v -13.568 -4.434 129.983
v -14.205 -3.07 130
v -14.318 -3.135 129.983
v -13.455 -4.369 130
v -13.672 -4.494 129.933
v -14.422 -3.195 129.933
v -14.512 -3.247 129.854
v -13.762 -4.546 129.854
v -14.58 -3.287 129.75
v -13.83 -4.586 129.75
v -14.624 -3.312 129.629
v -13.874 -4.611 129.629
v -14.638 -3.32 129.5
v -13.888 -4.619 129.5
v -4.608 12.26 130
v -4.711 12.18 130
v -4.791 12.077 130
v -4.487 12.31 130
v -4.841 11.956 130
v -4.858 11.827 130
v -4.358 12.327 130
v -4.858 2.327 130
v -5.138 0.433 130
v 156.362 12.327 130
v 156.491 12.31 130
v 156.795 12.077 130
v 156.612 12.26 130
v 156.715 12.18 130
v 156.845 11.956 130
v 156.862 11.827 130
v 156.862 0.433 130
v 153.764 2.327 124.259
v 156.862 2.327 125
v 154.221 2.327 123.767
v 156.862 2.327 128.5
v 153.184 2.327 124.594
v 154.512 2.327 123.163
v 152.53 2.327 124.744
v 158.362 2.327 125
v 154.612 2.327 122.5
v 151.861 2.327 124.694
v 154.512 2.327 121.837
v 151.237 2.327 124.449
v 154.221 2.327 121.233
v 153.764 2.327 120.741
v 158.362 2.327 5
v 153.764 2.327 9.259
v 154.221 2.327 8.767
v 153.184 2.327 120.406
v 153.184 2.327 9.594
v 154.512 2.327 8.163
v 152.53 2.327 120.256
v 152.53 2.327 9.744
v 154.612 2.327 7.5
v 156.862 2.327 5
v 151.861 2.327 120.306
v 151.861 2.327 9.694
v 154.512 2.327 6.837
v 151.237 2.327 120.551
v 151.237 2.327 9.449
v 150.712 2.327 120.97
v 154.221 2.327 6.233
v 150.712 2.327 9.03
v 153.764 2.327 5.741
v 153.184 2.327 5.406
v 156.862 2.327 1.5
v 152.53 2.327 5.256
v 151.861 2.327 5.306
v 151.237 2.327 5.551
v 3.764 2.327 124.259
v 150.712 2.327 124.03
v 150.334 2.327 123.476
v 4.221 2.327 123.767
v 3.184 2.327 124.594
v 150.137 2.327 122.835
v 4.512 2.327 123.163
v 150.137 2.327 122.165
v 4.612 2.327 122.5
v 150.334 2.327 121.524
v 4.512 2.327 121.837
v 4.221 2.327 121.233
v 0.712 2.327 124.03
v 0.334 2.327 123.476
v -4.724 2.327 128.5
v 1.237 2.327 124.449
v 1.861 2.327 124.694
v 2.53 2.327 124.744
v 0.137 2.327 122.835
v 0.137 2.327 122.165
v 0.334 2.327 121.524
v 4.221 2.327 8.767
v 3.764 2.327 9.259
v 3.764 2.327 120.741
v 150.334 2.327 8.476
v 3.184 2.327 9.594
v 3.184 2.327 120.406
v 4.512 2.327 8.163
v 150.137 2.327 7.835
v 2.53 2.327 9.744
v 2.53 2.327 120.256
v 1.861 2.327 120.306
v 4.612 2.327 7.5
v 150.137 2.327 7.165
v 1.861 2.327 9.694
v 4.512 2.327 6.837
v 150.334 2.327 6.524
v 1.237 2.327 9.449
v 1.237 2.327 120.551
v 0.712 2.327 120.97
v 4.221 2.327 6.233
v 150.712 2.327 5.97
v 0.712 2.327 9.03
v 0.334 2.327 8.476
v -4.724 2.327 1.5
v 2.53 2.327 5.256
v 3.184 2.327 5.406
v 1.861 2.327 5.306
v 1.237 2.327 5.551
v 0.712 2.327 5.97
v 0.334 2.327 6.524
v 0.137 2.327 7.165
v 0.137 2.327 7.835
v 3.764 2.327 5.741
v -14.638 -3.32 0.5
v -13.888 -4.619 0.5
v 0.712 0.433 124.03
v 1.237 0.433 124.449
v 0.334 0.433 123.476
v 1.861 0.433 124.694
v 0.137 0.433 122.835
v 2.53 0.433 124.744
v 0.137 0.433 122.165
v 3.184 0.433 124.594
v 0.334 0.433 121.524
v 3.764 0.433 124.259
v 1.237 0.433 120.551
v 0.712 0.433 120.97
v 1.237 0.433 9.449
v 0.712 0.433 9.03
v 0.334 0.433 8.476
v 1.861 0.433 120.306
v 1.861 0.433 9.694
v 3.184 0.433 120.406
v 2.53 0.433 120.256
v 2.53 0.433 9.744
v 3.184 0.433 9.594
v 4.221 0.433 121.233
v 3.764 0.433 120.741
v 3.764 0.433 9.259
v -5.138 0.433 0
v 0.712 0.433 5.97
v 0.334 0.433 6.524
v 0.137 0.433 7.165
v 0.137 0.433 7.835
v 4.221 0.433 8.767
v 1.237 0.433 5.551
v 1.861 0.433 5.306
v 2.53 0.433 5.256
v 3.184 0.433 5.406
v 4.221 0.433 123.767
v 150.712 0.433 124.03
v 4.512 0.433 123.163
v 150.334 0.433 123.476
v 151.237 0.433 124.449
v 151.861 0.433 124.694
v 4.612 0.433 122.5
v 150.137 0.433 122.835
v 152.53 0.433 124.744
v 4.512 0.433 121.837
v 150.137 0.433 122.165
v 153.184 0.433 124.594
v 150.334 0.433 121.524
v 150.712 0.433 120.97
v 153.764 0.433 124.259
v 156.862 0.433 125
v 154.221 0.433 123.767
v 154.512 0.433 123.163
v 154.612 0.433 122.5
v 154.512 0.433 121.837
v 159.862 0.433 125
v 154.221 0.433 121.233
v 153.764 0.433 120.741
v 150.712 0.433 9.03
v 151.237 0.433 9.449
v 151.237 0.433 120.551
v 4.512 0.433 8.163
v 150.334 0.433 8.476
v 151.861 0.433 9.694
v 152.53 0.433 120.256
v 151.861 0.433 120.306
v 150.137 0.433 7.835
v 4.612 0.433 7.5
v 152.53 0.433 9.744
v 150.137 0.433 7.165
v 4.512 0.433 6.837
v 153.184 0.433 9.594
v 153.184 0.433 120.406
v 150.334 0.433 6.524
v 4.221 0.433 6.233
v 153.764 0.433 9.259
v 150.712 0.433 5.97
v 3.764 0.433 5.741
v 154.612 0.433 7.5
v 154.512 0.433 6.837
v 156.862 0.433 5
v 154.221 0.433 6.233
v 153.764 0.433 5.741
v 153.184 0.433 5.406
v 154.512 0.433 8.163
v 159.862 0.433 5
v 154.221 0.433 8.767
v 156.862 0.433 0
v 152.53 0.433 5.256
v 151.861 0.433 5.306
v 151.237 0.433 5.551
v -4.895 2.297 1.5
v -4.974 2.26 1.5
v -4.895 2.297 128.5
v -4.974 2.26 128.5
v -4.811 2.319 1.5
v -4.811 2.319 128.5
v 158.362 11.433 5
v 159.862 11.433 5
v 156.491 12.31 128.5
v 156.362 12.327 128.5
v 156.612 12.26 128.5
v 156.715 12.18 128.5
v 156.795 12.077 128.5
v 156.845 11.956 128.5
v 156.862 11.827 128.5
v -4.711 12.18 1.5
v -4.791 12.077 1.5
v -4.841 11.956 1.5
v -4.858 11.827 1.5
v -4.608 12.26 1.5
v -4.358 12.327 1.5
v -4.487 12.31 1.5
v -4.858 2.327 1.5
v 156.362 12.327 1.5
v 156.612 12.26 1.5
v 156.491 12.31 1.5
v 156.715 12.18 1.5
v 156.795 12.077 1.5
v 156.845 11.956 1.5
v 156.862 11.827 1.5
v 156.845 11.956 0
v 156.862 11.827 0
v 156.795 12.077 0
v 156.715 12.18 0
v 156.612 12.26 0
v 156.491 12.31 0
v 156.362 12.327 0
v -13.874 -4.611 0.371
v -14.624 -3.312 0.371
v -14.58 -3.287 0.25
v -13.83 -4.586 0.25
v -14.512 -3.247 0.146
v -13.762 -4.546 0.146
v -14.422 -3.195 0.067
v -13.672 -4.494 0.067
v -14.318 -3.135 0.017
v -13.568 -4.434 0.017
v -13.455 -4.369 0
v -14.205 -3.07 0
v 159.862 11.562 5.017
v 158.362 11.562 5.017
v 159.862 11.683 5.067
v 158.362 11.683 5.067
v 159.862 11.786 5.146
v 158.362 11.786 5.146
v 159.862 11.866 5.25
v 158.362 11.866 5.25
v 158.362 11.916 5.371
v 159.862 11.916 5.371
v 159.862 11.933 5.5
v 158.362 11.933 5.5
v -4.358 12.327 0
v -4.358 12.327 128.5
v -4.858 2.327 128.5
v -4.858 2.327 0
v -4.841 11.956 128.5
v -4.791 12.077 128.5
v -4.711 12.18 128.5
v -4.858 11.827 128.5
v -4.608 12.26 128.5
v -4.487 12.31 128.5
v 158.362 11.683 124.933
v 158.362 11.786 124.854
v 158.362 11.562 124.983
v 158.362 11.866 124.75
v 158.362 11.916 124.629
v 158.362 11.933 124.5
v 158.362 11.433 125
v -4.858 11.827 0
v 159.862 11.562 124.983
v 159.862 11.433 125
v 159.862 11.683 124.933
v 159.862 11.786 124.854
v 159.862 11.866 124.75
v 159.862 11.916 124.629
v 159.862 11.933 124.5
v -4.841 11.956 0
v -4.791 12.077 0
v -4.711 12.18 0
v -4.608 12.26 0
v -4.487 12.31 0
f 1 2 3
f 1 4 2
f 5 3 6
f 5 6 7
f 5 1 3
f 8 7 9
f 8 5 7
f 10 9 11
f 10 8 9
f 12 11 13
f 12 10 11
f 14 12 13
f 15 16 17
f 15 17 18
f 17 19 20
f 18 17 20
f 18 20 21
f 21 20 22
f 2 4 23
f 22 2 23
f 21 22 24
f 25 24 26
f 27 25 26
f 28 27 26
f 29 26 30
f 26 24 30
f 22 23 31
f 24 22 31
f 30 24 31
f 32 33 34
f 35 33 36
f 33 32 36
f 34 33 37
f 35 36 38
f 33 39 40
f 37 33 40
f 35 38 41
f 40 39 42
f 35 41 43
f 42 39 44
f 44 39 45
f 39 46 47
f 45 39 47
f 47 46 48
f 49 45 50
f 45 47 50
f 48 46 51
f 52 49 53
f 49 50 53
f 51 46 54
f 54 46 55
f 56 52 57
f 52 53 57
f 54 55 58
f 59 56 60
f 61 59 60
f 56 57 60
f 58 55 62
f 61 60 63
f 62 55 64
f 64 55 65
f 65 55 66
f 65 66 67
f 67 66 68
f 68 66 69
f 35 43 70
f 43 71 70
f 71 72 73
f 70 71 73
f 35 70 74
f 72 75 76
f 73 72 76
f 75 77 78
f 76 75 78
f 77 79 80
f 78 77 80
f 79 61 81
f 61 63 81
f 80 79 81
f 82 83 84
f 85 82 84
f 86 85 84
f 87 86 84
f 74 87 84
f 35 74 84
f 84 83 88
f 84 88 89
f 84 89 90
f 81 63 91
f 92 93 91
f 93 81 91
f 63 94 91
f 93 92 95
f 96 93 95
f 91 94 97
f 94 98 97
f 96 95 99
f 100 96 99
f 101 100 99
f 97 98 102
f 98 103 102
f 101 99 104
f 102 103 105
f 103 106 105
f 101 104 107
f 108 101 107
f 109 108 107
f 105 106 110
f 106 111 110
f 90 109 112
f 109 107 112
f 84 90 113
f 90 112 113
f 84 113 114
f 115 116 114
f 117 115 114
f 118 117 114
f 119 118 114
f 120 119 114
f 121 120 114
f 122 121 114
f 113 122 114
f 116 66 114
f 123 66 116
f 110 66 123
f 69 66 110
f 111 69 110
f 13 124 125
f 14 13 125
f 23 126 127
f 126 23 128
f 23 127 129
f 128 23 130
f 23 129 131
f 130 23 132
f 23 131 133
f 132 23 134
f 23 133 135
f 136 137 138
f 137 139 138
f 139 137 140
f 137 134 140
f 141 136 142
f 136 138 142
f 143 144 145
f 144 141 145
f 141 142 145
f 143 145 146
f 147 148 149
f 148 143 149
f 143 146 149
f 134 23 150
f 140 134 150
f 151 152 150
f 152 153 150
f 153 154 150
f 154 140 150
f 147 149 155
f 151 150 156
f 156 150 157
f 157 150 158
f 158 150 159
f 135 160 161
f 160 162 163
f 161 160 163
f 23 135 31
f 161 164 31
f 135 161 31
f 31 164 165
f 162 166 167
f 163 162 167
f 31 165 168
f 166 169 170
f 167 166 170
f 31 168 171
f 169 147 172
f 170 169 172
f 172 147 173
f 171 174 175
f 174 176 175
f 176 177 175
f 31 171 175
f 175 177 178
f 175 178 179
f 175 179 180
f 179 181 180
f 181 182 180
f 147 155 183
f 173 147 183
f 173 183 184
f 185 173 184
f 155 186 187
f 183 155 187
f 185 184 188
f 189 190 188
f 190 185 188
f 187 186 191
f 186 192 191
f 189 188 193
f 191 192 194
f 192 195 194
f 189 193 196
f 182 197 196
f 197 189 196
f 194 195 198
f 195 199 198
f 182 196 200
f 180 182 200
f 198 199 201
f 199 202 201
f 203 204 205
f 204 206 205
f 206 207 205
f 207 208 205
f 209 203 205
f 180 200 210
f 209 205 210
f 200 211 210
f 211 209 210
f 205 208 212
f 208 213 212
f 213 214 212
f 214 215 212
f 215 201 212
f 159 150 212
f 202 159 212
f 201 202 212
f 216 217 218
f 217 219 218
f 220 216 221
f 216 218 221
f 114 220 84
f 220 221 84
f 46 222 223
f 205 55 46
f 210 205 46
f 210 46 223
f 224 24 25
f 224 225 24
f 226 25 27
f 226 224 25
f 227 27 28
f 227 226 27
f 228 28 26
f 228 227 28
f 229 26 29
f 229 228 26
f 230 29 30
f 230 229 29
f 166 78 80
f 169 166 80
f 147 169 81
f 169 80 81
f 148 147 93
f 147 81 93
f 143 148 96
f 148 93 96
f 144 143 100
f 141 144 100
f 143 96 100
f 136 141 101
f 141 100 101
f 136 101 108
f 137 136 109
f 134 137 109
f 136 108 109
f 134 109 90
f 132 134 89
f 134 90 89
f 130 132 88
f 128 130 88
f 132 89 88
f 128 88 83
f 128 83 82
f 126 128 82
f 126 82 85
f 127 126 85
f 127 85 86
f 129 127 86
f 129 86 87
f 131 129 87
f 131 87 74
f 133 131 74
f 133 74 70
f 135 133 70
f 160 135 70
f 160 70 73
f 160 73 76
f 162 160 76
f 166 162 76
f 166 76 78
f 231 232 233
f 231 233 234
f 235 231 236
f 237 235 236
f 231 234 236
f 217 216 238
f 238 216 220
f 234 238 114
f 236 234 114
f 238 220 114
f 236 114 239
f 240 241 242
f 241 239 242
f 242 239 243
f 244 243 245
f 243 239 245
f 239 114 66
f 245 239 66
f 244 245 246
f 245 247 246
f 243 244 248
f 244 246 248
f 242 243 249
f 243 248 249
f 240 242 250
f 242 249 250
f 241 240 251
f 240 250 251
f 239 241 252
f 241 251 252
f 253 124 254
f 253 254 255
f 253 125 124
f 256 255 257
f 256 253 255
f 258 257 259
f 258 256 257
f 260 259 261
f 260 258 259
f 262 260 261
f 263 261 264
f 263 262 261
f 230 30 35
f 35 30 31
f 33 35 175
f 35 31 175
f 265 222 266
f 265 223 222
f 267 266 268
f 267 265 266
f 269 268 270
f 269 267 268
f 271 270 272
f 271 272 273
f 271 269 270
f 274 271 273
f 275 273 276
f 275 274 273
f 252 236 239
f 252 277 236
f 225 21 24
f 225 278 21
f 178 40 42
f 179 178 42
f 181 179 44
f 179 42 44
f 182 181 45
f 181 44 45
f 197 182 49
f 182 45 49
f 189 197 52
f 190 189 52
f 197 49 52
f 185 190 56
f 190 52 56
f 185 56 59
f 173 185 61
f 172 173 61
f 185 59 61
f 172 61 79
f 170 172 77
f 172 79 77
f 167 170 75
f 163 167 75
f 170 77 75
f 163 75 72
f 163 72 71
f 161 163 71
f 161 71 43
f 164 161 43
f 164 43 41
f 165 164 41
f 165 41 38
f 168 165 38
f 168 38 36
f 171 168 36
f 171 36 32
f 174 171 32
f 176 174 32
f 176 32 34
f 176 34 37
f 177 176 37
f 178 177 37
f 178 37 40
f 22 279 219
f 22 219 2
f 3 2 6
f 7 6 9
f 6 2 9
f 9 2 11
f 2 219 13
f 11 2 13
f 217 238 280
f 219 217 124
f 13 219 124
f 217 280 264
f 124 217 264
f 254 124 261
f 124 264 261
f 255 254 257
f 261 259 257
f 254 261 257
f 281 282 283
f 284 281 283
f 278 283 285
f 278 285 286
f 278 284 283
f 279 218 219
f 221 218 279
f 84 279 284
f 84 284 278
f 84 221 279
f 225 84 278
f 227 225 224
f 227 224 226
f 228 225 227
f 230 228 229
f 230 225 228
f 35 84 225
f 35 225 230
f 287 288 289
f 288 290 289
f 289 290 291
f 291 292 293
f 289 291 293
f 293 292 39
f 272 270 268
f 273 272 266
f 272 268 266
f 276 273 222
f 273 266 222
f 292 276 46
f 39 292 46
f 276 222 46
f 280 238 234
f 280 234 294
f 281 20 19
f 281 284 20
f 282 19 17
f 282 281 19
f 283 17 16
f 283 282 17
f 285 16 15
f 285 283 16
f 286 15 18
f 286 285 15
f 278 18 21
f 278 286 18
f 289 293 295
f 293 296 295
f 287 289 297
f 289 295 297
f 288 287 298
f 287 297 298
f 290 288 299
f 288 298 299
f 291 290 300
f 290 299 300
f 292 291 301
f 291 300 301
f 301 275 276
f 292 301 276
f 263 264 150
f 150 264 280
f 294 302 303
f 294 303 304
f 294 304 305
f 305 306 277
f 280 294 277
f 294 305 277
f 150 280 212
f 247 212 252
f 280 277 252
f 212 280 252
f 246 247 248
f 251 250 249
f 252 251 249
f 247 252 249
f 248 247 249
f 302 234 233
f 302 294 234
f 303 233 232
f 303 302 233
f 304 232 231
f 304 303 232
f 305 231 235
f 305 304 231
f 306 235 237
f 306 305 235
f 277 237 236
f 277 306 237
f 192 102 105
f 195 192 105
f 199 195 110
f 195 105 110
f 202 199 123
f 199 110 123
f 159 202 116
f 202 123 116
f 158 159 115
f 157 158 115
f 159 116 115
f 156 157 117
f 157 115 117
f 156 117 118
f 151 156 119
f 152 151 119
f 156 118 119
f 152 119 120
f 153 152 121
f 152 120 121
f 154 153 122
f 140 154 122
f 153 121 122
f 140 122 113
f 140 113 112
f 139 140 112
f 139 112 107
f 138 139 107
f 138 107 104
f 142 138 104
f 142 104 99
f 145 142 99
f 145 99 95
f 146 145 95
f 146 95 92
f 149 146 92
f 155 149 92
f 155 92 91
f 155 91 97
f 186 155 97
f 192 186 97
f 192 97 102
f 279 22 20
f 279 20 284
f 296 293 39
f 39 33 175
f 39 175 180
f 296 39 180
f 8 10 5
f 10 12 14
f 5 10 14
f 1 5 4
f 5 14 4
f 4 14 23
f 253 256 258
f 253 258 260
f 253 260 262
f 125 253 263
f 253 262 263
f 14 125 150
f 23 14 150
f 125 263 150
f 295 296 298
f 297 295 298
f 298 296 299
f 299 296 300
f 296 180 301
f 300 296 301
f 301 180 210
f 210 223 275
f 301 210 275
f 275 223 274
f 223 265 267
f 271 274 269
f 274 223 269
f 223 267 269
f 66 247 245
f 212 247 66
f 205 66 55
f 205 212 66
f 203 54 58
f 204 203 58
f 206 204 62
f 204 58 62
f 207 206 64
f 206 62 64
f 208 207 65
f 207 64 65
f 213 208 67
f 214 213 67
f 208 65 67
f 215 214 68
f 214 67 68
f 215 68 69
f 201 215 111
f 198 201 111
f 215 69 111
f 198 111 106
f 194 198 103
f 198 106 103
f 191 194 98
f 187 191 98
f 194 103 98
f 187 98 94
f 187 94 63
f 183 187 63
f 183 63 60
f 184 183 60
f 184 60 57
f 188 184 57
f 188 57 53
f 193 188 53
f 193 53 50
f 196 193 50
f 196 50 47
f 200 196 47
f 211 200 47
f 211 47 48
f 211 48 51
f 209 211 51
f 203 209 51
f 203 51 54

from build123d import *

# Parameters (mm, degrees)
BOSS_EXTRUDE1_DEPTH = 130
SKETCH3_W           = 3
SKETCH3_H           = 5
CUT_EXTRUDE1_DEPTH  = 12.5
SKETCH4_W           = 161.719208284
SKETCH4_H           = 1.5
BOSS_EXTRUDE2_DEPTH = 10
SKETCH5_R           = 2.25
CUT_EXTRUDE2_DEPTH  = 7.945980836
FILLET1_R           = 0.5


with BuildPart() as part:
    # Sketch1 → Boss-Extrude1 (new body)
    with BuildSketch(Plane.XY):
        Polygon((-4.857650715, 2.326869046), (-14.638442431, -3.320073684), (-13.888442431, -4.61911179), (-5.138442431, 0.432703066), (159.861557569, 0.432703066), (159.861557569, 11.932703066), (158.361557569, 11.932703066), (158.361557569, 2.326869046), align=None)
    extrude(amount=BOSS_EXTRUDE1_DEPTH)

    # Sketch3 → Cut-Extrude1 (cut, through all)
    with BuildSketch(Plane.XZ.offset(-0.432703066)):
        with Locations((158.361557569, 127.5)):
            Rectangle(SKETCH3_W, SKETCH3_H)
        with Locations((158.361557569, 2.5)):
            Rectangle(SKETCH3_W, SKETCH3_H)
    extrude(amount=-CUT_EXTRUDE1_DEPTH, mode=Mode.SUBTRACT)

    # Sketch4 → Boss-Extrude2 (add)
    with BuildSketch(Plane(origin=(0, 2.326869046, 0), x_dir=(1, 0, 0), z_dir=(0, 1, 0))):
        with Locations((76.001953427, -129.25)):
            Rectangle(SKETCH4_W, SKETCH4_H)
        with Locations((76.001953427, -0.75)):
            Rectangle(SKETCH4_W, SKETCH4_H)
    extrude(amount=BOSS_EXTRUDE2_DEPTH)

    # Sketch5 → Cut-Extrude2 (cut, through all)
    with BuildSketch(Plane(origin=(0, 2.326869046, 0), x_dir=(1, 0, 0), z_dir=(0, 1, 0))):
        with Locations((2.361557569, -122.5)):
            Circle(SKETCH5_R)
        with Locations((2.361557569, -7.5)):
            Circle(SKETCH5_R)
        with Locations((152.361557569, -7.5)):
            Circle(SKETCH5_R)
        with Locations((152.361557569, -122.5)):
            Circle(SKETCH5_R)
    extrude(amount=-CUT_EXTRUDE2_DEPTH, mode=Mode.SUBTRACT)

    # Fillet1
    fillet1_edges = [part.edges().sort_by_distance(p)[0] for p in [
        (-14.263442431, -3.969592737, 130),
        (159.111557569, 11.932703066, 125),
        (159.111557569, 11.932703066, 5),
        (-4.857650715, 2.326869046, 65),
        (156.861557569, 12.326869046, 129.25),
        (-4.857650715, 12.326869046, 129.25),
        (-4.857650715, 12.326869046, 0.75),
        (156.861557569, 12.326869046, 0.75),
        (-14.263442431, -3.969592737, 0),
    ]]
    fillet(fillet1_edges, radius=FILLET1_R)


solid = part.part
